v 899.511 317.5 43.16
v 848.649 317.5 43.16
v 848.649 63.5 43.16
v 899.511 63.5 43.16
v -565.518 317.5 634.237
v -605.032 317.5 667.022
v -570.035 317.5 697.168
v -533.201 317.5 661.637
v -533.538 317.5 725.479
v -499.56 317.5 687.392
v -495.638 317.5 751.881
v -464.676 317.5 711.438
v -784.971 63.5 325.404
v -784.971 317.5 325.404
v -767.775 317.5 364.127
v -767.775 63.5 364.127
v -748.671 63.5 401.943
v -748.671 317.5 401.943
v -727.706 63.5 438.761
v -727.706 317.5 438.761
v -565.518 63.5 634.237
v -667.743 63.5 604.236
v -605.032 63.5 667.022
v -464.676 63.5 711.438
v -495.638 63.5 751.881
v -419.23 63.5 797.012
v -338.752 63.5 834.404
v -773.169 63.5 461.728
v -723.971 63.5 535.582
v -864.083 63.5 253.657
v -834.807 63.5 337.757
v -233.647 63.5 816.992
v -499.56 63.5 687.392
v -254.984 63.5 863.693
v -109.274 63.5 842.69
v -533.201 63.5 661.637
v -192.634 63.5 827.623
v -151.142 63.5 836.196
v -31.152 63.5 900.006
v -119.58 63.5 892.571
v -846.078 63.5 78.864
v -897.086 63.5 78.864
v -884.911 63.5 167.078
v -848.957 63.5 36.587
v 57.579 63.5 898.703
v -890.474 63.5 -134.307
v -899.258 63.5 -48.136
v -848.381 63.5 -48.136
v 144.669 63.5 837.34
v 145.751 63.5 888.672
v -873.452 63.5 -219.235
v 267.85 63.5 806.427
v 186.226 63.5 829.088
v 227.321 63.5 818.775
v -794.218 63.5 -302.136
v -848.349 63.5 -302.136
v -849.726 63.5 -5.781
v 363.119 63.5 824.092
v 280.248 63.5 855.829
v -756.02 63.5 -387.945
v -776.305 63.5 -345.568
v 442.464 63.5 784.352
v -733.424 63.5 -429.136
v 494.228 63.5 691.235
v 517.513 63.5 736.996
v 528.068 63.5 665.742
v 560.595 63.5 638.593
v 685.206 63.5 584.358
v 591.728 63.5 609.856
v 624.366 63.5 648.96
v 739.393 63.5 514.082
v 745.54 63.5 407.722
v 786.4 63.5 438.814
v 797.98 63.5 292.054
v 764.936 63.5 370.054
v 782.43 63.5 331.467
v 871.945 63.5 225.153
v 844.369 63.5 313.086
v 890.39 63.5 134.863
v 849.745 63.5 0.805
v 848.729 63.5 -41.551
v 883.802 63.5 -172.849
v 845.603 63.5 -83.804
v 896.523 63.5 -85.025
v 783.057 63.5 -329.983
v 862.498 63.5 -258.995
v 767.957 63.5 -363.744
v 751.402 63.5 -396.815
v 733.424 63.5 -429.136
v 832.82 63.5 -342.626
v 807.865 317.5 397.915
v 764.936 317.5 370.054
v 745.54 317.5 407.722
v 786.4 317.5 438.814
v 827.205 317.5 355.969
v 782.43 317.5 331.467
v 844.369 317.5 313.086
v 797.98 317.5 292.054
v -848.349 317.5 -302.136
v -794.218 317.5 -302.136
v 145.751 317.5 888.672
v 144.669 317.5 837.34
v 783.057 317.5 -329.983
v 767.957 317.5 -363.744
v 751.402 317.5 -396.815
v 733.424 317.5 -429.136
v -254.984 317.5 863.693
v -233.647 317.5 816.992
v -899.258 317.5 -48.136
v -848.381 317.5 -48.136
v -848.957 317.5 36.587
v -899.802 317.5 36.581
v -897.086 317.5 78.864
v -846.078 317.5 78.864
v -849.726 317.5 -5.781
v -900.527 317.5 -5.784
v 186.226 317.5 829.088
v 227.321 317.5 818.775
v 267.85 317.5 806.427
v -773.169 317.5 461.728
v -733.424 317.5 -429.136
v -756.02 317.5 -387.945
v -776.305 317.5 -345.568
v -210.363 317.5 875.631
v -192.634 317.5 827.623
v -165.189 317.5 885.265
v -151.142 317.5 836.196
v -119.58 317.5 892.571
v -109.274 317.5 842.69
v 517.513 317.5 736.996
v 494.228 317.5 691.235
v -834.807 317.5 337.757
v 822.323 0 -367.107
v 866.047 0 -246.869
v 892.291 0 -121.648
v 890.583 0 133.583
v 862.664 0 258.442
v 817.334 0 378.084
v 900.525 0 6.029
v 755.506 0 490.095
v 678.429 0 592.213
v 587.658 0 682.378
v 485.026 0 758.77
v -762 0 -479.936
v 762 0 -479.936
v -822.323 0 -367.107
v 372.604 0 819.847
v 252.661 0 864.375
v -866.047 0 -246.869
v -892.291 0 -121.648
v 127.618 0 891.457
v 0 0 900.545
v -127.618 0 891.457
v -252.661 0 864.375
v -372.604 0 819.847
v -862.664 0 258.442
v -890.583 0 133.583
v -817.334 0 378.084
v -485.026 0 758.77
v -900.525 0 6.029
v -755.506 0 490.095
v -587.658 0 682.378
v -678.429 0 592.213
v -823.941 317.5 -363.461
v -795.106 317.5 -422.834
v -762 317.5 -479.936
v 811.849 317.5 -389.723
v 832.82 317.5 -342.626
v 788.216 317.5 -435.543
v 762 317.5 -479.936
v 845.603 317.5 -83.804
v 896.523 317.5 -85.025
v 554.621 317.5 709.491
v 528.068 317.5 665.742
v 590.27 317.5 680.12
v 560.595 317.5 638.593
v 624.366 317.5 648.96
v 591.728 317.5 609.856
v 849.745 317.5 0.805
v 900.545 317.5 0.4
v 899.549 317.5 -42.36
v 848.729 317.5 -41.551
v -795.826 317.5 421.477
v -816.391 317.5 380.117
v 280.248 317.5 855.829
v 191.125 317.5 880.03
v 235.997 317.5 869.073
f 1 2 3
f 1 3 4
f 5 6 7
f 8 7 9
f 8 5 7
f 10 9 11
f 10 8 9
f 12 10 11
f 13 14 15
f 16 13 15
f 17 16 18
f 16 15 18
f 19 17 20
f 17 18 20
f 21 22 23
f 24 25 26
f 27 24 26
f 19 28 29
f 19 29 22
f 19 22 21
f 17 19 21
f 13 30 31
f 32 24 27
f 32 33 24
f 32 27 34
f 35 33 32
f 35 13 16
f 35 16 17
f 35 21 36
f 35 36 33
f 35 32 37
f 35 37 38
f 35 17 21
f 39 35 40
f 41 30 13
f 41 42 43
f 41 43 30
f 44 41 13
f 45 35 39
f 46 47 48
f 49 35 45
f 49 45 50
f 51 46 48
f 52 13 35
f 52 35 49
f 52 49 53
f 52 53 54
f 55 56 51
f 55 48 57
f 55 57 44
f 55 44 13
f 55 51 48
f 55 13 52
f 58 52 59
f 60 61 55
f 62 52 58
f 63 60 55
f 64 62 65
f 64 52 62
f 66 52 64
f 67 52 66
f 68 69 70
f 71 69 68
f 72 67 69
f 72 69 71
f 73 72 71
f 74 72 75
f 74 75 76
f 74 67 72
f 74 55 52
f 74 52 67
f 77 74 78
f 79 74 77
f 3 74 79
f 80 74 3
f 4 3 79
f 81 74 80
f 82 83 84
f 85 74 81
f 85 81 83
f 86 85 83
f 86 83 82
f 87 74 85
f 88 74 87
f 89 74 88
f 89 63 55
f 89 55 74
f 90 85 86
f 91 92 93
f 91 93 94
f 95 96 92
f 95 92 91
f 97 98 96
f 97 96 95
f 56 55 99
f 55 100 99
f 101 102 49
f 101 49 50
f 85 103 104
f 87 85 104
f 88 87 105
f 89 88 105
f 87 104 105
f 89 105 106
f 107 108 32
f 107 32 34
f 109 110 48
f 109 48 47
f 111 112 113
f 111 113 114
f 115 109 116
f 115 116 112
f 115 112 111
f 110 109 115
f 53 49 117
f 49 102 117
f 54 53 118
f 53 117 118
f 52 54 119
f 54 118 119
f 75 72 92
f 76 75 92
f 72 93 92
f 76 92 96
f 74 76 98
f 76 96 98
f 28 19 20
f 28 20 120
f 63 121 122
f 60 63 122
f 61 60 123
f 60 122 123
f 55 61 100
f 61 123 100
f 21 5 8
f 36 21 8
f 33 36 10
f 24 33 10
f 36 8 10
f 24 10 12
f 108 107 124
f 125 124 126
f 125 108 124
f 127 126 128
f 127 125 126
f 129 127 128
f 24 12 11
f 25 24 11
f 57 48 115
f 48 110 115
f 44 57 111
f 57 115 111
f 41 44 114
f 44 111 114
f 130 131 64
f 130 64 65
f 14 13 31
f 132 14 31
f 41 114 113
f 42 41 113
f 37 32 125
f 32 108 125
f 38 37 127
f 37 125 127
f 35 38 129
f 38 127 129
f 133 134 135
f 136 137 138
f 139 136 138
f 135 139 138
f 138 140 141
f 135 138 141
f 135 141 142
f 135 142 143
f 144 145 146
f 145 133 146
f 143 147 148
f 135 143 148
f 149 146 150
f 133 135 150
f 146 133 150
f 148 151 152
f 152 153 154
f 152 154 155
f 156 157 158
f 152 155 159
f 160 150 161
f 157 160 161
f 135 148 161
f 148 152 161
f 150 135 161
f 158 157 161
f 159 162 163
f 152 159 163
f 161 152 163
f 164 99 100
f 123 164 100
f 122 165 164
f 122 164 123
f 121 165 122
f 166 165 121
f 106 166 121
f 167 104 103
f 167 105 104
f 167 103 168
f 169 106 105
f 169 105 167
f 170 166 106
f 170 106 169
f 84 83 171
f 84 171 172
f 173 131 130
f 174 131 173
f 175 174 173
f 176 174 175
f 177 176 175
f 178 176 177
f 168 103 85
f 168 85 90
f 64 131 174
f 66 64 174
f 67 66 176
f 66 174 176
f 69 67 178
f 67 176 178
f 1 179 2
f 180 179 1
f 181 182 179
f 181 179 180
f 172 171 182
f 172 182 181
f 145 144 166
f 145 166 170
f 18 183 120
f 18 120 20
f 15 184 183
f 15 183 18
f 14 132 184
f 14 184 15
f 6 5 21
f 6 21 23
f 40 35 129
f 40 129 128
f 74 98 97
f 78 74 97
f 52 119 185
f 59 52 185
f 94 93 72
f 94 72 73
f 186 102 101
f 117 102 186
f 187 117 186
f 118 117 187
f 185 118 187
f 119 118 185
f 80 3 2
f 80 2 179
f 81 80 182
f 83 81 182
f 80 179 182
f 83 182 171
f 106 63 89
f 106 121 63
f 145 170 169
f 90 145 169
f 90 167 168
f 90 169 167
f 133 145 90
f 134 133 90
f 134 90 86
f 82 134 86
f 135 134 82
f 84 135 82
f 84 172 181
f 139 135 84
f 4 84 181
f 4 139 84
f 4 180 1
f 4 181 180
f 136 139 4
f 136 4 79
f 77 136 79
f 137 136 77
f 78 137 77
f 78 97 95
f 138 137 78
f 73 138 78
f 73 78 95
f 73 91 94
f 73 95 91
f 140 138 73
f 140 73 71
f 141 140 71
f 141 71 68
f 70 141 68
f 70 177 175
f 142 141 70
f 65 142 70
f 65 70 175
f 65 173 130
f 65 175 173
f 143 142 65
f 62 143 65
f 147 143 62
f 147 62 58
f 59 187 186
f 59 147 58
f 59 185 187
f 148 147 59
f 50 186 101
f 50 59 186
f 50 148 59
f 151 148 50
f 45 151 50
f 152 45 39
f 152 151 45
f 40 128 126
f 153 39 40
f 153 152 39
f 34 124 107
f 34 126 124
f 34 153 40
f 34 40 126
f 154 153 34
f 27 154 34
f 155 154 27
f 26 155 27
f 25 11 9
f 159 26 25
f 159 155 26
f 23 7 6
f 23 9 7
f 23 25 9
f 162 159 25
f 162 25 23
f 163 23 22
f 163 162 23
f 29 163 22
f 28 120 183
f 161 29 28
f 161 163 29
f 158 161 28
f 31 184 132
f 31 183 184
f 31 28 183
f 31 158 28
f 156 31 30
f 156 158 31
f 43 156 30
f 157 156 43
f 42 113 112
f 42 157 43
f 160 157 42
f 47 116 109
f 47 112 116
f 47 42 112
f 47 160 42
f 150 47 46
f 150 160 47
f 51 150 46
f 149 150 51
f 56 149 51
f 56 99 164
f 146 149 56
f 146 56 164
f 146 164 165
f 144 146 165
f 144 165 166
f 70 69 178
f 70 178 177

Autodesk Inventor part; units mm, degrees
ref_plane "YZ Plane" through (0, 0, 0) normal (1, 0, 0) x (0, 1, 0)
ref_plane "XZ Plane" through (0, 0, 0) normal (0, 1, 0) x (-1, 0, 0)
ref_plane "XY Plane" through (0, 0, 0) normal (0, 0, 1) x (1, 0, 0)
sketch "Sketch2" plane through (0, 0, 0) normal (0, 1, 0) x (-1, 0, 0)
  arc A0 (762, -479.9355) -> (-762, -479.9355) centre (0, 0) ccw
  line L0 (900.5455, 0) -> (762, 0)
  line L1 (762, -479.9355) -> (-762, -479.9355)
  dimension "d8" = 1524
extrude "Extrusion1" add sketch "Sketch2" along normal blind 63.5
sketch "Sketch9" plane through (0, 63.5, 0) normal (0, 1, 0) x (1, 0, 0)
  arc A0 (-762, 479.9355) -> (762, 479.9355) centre (0, 0) ccw
  line L0 (762, 479.9355) -> (-762, 479.9355) projected
  line L1 (-762, 479.9355) -> (762, 479.9355)
extrude "Extrusion10" add sketch "Sketch9" along normal blind 254
sketch "Sketch10" plane through (0, 317.5, 0) normal (0, 1, 0) x (1, 0, 0)
  arc A0 (-762, 479.9355) -> (762, 479.9355) centre (0, 0) ccw
  line L0 (762, 479.9355) -> (-762, 479.9355) projected
  line L1 (-762, 479.9355) -> (762, 479.9355)
  arc A1 (-733.4235, 429.1355) -> (733.4235, 429.1355) centre (0, 0) ccw
  line L2 (-733.4235, 429.1355) -> (733.4235, 429.1355)
  line L3 (-733.4235, 429.1355) -> (-791.7227, 429.1355)
  arc A2 (-762, 479.9355) -> (762, 479.9355) centre (0, 0) ccw projected
  line L4 (733.4235, 429.1355) -> (791.7227, 429.1355)
  line L5 (-794.2175, 302.1355) -> (-848.3491, 302.1355)
  line L6 (-848.381, 48.1355) -> (-899.0048, 48.1355)
  line L7 (-846.0779, -78.8645) -> (-891.7459, -78.8645)
  line L8 (-891.7459, -78.8645) -> (-897.0856, -78.8645)
  line L9 (-899.0048, 48.1355) -> (-899.2581, 48.1355)
  arc A3 (-762, 479.9355) -> (762, 479.9355) centre (0, 0) ccw projected
  line L10 (-784.9709, -325.4044) -> (-834.8069, -337.7567)
  line L11 (-784.9709, -325.4044) -> (-727.706, -438.7611)
  line L12 (-727.706, -438.7611) -> (-773.1686, -461.7276)
  line L13 (-565.5178, -634.2373) -> (-605.0317, -667.0223)
  line L14 (-565.5178, -634.2373) -> (-464.6758, -711.4378)
  line L15 (-464.6758, -711.4378) -> (-495.6377, -751.8812)
  line L16 (-233.6472, -816.9923) -> (-254.9841, -863.6928)
  line L17 (-109.2742, -842.69) -> (-119.5805, -892.5708)
  line L18 (144.6694, -837.3399) -> (145.7509, -888.6725)
  line L19 (267.8496, -806.4266) -> (280.2477, -855.8291)
  line L20 (494.2276, -691.2354) -> (517.5126, -736.9958)
  line L21 (591.7285, -609.8563) -> (625.6901, -650.5458)
  line L22 (745.5399, -407.7225) -> (786.3996, -438.8142)
  line L23 (797.9796, -292.0545) -> (844.3692, -313.0859)
  line L24 (848.6487, -43.1597) -> (899.5106, -43.1597)
  line L25 (845.6029, 83.8038) -> (896.5226, 85.0253)
  line L26 (783.0573, 329.9827) -> (832.8203, 342.6258)
  point P0 (624.3663, -648.9598)
  dimension "d44" = 50.8
extrude "Extrusion13" cut sketch "Sketch10" against normal blind 254 contours L5 A1 L6 L9 A0 | A0 L25 A1 L26 | L8 L7 A1 L10 A0 | A0 L23 A1 L24 | L12 A1 L13 A0 | A0 L21 A1 L22 | L15 A1 L16 A0 | A0 L19 A1 L20 | L17 A1 L18 A0
sketch "Sketch12" plane through (0, 317.5, 0) normal (0, 1, 0) x (1, 0, 0)
  arc A0 (899.5106, -43.1597) -> (896.5226, 85.0253) centre (0, 0) ccw projected
  arc A1 (-762, 479.9355) -> (762, 479.9355) centre (0, 0) ccw
  line L0 (762, 479.9355) -> (-762, 479.9355) projected
  line L1 (-762, 479.9355) -> (762, 479.9355)
  arc A2 (-733.4235, 429.1355) -> (733.4235, 429.1355) centre (0, 0) ccw
  line L2 (-733.4235, 429.1355) -> (733.4235, 429.1355)
  dimension "d73" = 50.8
extrude "Extrusion14" cut sketch "Sketch12" against normal blind 254 contours L2 A2
properties part number "Nest-ver3-1111-2021"
